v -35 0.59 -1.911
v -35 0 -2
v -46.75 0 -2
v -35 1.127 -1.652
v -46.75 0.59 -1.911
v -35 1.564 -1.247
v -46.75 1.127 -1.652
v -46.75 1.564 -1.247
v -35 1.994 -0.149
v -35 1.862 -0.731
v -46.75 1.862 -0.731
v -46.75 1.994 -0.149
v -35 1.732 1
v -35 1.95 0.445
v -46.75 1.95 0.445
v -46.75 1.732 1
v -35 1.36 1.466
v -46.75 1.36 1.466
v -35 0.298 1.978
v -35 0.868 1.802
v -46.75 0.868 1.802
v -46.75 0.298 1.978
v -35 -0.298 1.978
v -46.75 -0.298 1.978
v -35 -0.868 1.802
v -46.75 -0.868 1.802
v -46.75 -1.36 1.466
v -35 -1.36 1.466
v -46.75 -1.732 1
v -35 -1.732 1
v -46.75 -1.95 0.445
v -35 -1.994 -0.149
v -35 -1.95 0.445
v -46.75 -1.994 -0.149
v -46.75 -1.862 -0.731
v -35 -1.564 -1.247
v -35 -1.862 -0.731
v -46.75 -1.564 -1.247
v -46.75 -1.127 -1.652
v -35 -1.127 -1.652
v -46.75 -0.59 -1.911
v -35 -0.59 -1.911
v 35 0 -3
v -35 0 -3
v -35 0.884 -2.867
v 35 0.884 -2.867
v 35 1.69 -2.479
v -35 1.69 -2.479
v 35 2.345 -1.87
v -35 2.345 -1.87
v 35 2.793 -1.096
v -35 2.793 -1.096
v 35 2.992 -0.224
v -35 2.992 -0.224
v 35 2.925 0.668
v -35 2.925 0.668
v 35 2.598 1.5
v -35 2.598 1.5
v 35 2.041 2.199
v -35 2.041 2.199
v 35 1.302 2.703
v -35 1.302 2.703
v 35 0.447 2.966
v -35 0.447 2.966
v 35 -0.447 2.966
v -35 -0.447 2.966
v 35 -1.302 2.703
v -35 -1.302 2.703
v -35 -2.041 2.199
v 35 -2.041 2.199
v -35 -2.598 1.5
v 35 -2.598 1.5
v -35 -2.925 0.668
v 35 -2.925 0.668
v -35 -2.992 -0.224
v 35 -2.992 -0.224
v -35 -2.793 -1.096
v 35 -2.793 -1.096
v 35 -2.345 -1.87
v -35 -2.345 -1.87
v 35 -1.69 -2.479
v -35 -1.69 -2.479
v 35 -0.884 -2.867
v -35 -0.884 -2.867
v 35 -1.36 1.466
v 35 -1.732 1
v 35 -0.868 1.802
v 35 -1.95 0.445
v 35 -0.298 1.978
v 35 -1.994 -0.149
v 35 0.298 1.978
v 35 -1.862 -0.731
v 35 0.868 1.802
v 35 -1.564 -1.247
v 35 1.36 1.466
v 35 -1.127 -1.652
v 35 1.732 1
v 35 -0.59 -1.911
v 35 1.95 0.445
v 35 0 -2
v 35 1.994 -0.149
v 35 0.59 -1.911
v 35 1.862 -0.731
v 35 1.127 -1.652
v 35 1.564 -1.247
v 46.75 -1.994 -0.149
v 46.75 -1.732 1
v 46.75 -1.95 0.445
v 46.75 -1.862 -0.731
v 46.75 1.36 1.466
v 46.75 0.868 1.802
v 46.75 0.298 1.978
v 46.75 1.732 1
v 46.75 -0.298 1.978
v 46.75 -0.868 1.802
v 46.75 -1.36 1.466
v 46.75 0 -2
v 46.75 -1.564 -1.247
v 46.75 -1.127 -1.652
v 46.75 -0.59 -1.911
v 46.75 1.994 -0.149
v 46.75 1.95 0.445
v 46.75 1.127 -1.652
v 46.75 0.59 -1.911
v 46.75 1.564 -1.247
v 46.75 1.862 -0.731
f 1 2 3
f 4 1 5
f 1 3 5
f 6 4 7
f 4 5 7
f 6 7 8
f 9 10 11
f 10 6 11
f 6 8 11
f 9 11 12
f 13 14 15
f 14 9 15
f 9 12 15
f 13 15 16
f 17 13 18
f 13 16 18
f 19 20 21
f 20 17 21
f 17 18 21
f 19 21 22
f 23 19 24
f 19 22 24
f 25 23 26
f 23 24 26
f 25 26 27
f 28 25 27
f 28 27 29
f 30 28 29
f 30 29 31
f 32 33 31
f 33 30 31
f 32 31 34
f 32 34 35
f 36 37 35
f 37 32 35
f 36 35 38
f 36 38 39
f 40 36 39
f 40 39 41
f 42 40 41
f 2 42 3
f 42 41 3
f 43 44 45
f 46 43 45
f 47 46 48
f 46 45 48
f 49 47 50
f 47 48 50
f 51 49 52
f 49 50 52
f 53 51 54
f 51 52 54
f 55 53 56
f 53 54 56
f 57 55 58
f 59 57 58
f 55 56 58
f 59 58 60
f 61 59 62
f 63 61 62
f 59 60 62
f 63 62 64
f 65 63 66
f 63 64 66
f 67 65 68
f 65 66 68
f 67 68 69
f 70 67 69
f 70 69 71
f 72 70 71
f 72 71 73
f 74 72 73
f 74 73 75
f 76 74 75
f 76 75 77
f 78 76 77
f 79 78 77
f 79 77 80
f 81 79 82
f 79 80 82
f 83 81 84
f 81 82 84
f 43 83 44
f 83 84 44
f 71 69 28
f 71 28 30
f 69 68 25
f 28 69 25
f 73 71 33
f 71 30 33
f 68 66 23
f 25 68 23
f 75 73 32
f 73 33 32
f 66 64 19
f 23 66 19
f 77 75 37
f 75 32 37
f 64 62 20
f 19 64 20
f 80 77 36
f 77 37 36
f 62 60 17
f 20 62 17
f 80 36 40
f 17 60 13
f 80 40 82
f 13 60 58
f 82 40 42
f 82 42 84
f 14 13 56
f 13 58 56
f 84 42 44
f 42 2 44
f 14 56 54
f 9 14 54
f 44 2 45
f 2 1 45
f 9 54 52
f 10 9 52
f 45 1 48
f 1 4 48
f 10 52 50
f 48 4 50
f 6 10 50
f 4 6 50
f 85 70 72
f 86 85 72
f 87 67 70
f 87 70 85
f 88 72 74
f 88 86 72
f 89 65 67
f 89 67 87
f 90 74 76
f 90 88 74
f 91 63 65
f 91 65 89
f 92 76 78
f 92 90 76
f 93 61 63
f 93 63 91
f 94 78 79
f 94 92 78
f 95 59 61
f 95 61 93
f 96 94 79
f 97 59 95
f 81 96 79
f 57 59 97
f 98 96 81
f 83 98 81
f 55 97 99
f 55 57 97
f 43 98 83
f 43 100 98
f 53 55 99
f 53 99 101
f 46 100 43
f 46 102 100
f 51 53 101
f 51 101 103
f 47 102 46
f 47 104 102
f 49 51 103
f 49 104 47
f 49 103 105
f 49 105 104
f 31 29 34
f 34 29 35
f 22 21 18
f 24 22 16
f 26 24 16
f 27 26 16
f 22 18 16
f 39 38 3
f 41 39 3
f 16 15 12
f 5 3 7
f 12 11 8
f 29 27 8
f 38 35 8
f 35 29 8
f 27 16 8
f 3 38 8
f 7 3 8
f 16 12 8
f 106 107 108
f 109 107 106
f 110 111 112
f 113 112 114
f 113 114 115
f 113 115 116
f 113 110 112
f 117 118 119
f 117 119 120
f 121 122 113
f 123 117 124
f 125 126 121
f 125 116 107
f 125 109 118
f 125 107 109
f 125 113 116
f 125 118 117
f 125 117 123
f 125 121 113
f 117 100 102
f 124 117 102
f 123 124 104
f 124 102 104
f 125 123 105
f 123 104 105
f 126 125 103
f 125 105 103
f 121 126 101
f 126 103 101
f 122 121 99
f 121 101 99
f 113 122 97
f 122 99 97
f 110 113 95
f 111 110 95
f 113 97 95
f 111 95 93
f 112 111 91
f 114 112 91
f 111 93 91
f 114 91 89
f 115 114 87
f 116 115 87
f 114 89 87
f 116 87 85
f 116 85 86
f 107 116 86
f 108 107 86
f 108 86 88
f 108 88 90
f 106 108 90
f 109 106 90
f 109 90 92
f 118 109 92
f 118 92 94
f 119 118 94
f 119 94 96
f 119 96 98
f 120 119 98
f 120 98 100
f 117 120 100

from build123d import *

# Parameters (mm, degrees)
BOSS_EXTRUDE1_DEPTH      = 35
BOSS_EXTRUDE1_DEPTH_BACK = 35
SKETCH1_R                = 3
BOSS_EXTRUDE2_DEPTH      = 46.75
BOSS_EXTRUDE2_DEPTH_BACK = 46.75
SKETCH3_R                = 2


with BuildPart() as part:
    # Sketch1 → Boss-Extrude1 (new, two sides: drawn at the far end of the back side and taken through both)
    with BuildSketch(Plane(origin=(0, 0, 0), x_dir=(0, 0, -1), z_dir=(1, 0, 0)).offset(-BOSS_EXTRUDE1_DEPTH_BACK)):
        Circle(SKETCH1_R)
    extrude(amount=BOSS_EXTRUDE1_DEPTH + BOSS_EXTRUDE1_DEPTH_BACK)

    # Sketch3 → Boss-Extrude2 (add, two sides: drawn at the far end of the back side and taken through both)
    with BuildSketch(Plane(origin=(0, 0, 0), x_dir=(0, 0, -1), z_dir=(1, 0, 0)).offset(-BOSS_EXTRUDE2_DEPTH_BACK)):
        Circle(SKETCH3_R)
    extrude(amount=BOSS_EXTRUDE2_DEPTH + BOSS_EXTRUDE2_DEPTH_BACK)


solid = part.part
